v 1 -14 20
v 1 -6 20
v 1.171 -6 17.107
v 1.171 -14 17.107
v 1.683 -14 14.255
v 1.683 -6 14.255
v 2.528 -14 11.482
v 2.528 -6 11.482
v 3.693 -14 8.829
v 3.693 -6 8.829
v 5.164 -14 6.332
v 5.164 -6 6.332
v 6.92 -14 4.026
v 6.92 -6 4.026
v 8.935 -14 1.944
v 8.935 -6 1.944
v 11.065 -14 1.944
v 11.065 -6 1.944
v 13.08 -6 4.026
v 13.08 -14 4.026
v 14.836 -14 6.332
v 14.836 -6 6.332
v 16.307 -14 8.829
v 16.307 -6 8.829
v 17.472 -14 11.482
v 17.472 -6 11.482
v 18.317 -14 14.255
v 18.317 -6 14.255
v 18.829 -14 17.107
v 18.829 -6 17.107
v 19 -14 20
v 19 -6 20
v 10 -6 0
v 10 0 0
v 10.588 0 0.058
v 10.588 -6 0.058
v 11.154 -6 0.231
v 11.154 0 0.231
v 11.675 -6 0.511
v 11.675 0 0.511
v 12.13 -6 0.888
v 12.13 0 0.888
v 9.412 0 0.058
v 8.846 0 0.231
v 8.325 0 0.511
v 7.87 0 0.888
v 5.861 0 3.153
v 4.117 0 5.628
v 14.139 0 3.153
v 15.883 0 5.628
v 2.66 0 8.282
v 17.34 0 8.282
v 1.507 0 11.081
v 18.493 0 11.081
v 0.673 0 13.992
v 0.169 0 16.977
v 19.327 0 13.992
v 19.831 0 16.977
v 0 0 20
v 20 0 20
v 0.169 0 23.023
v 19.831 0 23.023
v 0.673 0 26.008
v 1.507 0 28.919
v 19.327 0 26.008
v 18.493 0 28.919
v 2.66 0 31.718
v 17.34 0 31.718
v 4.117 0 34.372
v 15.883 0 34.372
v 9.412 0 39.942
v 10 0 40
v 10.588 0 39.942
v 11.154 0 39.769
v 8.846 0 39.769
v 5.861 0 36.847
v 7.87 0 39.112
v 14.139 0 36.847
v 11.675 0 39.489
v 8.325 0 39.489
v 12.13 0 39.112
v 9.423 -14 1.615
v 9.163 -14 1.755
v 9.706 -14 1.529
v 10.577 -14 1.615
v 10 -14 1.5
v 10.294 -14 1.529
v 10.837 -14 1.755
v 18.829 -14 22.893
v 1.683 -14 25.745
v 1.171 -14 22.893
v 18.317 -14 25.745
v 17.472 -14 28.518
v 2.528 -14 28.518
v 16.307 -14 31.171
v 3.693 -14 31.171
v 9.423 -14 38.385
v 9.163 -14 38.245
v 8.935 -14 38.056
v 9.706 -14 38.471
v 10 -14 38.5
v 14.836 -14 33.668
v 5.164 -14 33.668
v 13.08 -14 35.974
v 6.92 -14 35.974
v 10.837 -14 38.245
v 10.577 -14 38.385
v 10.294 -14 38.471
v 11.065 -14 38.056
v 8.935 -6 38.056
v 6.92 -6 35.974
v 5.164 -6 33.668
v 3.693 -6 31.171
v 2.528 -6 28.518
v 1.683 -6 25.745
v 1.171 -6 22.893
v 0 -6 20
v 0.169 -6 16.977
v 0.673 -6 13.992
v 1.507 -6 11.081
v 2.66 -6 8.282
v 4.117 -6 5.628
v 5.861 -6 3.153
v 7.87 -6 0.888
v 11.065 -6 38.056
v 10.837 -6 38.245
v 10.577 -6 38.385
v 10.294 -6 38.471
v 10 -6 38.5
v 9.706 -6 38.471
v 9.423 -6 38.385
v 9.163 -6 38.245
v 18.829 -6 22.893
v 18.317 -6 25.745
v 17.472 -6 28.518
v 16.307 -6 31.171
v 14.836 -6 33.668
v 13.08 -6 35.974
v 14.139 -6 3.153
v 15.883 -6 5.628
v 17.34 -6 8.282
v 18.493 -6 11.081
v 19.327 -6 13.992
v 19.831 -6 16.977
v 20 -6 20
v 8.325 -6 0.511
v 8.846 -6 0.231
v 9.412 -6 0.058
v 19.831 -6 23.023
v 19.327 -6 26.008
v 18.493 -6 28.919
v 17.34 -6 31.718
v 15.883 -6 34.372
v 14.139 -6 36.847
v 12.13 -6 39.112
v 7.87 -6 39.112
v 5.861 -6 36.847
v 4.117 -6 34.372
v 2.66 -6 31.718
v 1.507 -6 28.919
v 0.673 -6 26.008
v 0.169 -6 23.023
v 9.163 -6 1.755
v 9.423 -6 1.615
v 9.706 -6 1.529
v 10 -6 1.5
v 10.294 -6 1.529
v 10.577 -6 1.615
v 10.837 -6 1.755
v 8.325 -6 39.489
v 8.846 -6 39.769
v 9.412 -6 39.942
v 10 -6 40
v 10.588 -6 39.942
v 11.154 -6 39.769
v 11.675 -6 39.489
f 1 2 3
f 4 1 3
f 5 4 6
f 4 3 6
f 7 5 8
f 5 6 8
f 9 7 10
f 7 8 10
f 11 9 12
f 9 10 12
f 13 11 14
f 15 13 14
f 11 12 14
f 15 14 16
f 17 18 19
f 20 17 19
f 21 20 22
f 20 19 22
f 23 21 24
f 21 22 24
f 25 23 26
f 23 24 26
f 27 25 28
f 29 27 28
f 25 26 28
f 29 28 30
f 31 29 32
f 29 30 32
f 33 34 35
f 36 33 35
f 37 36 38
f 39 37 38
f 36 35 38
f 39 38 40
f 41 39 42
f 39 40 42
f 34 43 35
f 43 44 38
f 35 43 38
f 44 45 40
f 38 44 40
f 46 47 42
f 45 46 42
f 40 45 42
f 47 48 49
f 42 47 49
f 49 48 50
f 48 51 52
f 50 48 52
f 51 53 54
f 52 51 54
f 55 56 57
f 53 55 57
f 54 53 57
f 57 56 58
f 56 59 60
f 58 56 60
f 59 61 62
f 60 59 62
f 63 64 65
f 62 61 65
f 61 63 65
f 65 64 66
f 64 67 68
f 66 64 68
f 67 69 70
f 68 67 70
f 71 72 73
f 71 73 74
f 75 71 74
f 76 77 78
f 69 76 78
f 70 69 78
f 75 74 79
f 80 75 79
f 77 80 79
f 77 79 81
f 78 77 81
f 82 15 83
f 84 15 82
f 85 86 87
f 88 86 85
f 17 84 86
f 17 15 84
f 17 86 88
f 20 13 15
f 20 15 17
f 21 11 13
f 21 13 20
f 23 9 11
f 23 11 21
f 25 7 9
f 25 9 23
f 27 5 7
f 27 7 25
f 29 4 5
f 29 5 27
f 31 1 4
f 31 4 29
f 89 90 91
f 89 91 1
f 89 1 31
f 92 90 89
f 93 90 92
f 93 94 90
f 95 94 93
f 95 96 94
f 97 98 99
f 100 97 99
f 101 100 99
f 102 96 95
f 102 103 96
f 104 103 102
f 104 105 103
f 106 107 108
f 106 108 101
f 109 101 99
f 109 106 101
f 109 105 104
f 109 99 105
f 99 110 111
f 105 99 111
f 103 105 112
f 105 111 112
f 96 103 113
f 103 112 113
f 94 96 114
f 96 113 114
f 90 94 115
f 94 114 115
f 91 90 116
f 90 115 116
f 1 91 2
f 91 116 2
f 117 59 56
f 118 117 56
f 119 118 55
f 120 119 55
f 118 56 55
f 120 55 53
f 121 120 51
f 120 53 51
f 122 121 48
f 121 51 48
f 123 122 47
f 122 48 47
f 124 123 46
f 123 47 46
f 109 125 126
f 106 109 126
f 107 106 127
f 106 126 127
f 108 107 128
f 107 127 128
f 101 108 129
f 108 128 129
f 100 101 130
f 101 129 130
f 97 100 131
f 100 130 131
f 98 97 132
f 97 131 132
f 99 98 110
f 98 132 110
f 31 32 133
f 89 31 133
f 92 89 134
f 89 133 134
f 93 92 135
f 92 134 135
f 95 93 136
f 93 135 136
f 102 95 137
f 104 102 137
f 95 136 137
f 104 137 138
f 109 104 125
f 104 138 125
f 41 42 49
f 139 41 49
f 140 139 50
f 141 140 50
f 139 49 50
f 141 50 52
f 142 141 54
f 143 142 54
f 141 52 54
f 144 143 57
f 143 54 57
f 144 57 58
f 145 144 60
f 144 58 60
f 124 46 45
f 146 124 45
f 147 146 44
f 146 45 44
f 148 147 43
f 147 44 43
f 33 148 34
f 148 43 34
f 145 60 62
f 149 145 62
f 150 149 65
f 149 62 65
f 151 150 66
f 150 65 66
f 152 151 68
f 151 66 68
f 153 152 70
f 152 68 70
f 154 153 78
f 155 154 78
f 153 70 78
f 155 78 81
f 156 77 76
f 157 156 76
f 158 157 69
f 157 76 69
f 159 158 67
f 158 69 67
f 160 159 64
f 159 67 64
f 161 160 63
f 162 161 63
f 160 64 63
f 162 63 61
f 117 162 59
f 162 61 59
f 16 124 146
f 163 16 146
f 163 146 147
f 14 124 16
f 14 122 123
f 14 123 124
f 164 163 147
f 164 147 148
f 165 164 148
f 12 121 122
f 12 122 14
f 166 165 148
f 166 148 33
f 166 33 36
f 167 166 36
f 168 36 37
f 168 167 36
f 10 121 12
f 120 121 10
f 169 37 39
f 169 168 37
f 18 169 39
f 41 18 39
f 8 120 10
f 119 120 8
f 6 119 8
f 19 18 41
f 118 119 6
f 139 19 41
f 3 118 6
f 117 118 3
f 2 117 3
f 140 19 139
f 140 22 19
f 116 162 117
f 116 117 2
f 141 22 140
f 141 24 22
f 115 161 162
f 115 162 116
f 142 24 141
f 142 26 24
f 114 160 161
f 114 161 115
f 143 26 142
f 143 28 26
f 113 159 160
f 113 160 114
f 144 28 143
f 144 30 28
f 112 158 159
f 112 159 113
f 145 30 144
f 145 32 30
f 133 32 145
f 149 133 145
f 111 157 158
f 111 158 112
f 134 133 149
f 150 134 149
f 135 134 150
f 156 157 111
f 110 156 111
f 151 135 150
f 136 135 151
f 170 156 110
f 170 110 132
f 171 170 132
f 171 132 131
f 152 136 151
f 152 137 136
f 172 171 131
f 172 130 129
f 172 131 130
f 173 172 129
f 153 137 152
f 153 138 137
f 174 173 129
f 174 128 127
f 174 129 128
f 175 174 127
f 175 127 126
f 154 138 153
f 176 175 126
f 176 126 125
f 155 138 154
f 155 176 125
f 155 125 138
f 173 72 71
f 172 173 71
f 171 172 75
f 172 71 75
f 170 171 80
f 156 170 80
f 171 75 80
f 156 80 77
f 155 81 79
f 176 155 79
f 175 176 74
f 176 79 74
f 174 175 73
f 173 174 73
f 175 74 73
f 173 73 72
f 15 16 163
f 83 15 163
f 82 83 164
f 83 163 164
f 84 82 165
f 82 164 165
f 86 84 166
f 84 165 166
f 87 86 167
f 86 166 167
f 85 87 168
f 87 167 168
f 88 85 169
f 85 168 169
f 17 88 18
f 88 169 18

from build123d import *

# Parameters (mm, degrees)
F1_DEPTH = 6
F3_DEPTH = 8


with BuildPart() as f1:
    # F0 (on Front) → F1 (new body)
    with BuildSketch(Plane.XZ):
        with BuildLine():
            ThreePointArc((7.8698224852, 39.1124260355), (2.0444516128, 30.3346375712), (0, 20))
            Line((0, 20), (10, 20))
            Line((10, 20), (10, 34))
            ThreePointArc((10, 34), (7.2307692308, 35.8461538462), (7.8698224852, 39.1124260355))
        make_face()
        with BuildLine():
            Line((10, 34), (10, 20))
            Line((10, 20), (20, 20))
            ThreePointArc((20, 20), (17.9555483872, 30.3346375712), (12.1301775148, 39.1124260355))
            ThreePointArc((12.1301775148, 39.1124260355), (12.7740342954, 38.1422494158), (13, 37))
            ThreePointArc((13, 37), (12.1213203436, 34.8786796564), (10, 34))
        make_face()
        with BuildLine():
            Line((10, 20), (0, 20))
            ThreePointArc((0, 20), (2.0444516128, 9.6653624288), (7.8698224852, 0.8875739645))
            ThreePointArc((7.8698224852, 0.8875739645), (7.2307692308, 4.1538461538), (10, 6))
            Line((10, 6), (10, 20))
        make_face()
        with BuildLine():
            Line((10, 20), (10, 6))
            ThreePointArc((10, 6), (12.1213203436, 5.1213203436), (13, 3))
            ThreePointArc((13, 3), (12.7740342954, 1.8577505842), (12.1301775148, 0.8875739645))
            ThreePointArc((12.1301775148, 0.8875739645), (17.9555483872, 9.6653624288), (20, 20))
            Line((20, 20), (10, 20))
        make_face()
        with BuildLine():
            ThreePointArc((7.8698224852, 0.8875739645), (8.8461538462, 0.2307692308), (10, 0))
            Line((10, 0), (10, 6))
            ThreePointArc((10, 6), (7.2307692308, 4.1538461538), (7.8698224852, 0.8875739645))
        make_face()
        with BuildLine():
            Line((10, 6), (10, 0))
            ThreePointArc((10, 0), (11.1538461538, 0.2307692308), (12.1301775148, 0.8875739645))
            ThreePointArc((12.1301775148, 0.8875739645), (12.7740342954, 1.8577505842), (13, 3))
            ThreePointArc((13, 3), (12.1213203436, 5.1213203436), (10, 6))
        make_face()
        with BuildLine():
            ThreePointArc((10, 40), (8.8461538462, 39.7692307692), (7.8698224852, 39.1124260355))
            ThreePointArc((7.8698224852, 39.1124260355), (7.2307692308, 35.8461538462), (10, 34))
            Line((10, 34), (10, 40))
        make_face()
        with BuildLine():
            ThreePointArc((12.1301775148, 39.1124260355), (11.1538461538, 39.7692307692), (10, 40))
            Line((10, 40), (10, 34))
            ThreePointArc((10, 34), (12.1213203436, 34.8786796564), (13, 37))
            ThreePointArc((13, 37), (12.7740342954, 38.1422494158), (12.1301775148, 39.1124260355))
        make_face()
    extrude(amount=F1_DEPTH)

    # F2 (on face) → F3 (join)
    with BuildSketch(Plane.XZ.offset(6)):
        with BuildLine():
            ThreePointArc((8.9349112426, 1.9437869822), (10, 1.5), (11.0650887574, 1.9437869822))
            ThreePointArc((11.0650887574, 1.9437869822), (16.5685312395, 10.2364871367), (18.5, 20))
            Line((18.5, 20), (2.4724225514, 20))
            Line((2.4724225514, 20), (1.5, 20))
            ThreePointArc((1.5, 20), (3.4314687605, 10.2364871367), (8.9349112426, 1.9437869822))
        make_face()
        with BuildLine():
            Line((2.4724225514, 20), (18.5, 20))
            ThreePointArc((18.5, 20), (16.5685312395, 29.7635128633), (11.0650887574, 38.0562130178))
            ThreePointArc((11.0650887574, 38.0562130178), (10, 38.5), (8.9349112426, 38.0562130178))
            ThreePointArc((8.9349112426, 38.0562130178), (3.4314687605, 29.7635128633), (1.5, 20))
            Line((1.5, 20), (2.4724225514, 20))
        make_face()
        with BuildLine():
            ThreePointArc((18.5, 20), (16.5685312395, 10.2364871367), (11.0650887574, 1.9437869822))
            ThreePointArc((11.0650887574, 1.9437869822), (16.9287608071, 10.1385897944), (19, 20))
            Line((19, 20), (18.5, 20))
        make_face()
        with BuildLine():
            ThreePointArc((11.0650887574, 38.0562130178), (16.5685312395, 29.7635128633), (18.5, 20))
            Line((18.5, 20), (19, 20))
            ThreePointArc((19, 20), (16.9287608071, 29.8614102056), (11.0650887574, 38.0562130178))
        make_face()
        with BuildLine():
            ThreePointArc((1, 20), (3.0712391929, 10.1385897944), (8.9349112426, 1.9437869822))
            ThreePointArc((8.9349112426, 1.9437869822), (3.4314687605, 10.2364871367), (1.5, 20))
            Line((1.5, 20), (1, 20))
        make_face()
        with BuildLine():
            Line((1, 20), (1.5, 20))
            ThreePointArc((1.5, 20), (3.4314687605, 29.7635128633), (8.9349112426, 38.0562130178))
            ThreePointArc((8.9349112426, 38.0562130178), (3.0712391929, 29.8614102056), (1, 20))
        make_face()
    extrude(amount=F3_DEPTH)


solid = f1.part
